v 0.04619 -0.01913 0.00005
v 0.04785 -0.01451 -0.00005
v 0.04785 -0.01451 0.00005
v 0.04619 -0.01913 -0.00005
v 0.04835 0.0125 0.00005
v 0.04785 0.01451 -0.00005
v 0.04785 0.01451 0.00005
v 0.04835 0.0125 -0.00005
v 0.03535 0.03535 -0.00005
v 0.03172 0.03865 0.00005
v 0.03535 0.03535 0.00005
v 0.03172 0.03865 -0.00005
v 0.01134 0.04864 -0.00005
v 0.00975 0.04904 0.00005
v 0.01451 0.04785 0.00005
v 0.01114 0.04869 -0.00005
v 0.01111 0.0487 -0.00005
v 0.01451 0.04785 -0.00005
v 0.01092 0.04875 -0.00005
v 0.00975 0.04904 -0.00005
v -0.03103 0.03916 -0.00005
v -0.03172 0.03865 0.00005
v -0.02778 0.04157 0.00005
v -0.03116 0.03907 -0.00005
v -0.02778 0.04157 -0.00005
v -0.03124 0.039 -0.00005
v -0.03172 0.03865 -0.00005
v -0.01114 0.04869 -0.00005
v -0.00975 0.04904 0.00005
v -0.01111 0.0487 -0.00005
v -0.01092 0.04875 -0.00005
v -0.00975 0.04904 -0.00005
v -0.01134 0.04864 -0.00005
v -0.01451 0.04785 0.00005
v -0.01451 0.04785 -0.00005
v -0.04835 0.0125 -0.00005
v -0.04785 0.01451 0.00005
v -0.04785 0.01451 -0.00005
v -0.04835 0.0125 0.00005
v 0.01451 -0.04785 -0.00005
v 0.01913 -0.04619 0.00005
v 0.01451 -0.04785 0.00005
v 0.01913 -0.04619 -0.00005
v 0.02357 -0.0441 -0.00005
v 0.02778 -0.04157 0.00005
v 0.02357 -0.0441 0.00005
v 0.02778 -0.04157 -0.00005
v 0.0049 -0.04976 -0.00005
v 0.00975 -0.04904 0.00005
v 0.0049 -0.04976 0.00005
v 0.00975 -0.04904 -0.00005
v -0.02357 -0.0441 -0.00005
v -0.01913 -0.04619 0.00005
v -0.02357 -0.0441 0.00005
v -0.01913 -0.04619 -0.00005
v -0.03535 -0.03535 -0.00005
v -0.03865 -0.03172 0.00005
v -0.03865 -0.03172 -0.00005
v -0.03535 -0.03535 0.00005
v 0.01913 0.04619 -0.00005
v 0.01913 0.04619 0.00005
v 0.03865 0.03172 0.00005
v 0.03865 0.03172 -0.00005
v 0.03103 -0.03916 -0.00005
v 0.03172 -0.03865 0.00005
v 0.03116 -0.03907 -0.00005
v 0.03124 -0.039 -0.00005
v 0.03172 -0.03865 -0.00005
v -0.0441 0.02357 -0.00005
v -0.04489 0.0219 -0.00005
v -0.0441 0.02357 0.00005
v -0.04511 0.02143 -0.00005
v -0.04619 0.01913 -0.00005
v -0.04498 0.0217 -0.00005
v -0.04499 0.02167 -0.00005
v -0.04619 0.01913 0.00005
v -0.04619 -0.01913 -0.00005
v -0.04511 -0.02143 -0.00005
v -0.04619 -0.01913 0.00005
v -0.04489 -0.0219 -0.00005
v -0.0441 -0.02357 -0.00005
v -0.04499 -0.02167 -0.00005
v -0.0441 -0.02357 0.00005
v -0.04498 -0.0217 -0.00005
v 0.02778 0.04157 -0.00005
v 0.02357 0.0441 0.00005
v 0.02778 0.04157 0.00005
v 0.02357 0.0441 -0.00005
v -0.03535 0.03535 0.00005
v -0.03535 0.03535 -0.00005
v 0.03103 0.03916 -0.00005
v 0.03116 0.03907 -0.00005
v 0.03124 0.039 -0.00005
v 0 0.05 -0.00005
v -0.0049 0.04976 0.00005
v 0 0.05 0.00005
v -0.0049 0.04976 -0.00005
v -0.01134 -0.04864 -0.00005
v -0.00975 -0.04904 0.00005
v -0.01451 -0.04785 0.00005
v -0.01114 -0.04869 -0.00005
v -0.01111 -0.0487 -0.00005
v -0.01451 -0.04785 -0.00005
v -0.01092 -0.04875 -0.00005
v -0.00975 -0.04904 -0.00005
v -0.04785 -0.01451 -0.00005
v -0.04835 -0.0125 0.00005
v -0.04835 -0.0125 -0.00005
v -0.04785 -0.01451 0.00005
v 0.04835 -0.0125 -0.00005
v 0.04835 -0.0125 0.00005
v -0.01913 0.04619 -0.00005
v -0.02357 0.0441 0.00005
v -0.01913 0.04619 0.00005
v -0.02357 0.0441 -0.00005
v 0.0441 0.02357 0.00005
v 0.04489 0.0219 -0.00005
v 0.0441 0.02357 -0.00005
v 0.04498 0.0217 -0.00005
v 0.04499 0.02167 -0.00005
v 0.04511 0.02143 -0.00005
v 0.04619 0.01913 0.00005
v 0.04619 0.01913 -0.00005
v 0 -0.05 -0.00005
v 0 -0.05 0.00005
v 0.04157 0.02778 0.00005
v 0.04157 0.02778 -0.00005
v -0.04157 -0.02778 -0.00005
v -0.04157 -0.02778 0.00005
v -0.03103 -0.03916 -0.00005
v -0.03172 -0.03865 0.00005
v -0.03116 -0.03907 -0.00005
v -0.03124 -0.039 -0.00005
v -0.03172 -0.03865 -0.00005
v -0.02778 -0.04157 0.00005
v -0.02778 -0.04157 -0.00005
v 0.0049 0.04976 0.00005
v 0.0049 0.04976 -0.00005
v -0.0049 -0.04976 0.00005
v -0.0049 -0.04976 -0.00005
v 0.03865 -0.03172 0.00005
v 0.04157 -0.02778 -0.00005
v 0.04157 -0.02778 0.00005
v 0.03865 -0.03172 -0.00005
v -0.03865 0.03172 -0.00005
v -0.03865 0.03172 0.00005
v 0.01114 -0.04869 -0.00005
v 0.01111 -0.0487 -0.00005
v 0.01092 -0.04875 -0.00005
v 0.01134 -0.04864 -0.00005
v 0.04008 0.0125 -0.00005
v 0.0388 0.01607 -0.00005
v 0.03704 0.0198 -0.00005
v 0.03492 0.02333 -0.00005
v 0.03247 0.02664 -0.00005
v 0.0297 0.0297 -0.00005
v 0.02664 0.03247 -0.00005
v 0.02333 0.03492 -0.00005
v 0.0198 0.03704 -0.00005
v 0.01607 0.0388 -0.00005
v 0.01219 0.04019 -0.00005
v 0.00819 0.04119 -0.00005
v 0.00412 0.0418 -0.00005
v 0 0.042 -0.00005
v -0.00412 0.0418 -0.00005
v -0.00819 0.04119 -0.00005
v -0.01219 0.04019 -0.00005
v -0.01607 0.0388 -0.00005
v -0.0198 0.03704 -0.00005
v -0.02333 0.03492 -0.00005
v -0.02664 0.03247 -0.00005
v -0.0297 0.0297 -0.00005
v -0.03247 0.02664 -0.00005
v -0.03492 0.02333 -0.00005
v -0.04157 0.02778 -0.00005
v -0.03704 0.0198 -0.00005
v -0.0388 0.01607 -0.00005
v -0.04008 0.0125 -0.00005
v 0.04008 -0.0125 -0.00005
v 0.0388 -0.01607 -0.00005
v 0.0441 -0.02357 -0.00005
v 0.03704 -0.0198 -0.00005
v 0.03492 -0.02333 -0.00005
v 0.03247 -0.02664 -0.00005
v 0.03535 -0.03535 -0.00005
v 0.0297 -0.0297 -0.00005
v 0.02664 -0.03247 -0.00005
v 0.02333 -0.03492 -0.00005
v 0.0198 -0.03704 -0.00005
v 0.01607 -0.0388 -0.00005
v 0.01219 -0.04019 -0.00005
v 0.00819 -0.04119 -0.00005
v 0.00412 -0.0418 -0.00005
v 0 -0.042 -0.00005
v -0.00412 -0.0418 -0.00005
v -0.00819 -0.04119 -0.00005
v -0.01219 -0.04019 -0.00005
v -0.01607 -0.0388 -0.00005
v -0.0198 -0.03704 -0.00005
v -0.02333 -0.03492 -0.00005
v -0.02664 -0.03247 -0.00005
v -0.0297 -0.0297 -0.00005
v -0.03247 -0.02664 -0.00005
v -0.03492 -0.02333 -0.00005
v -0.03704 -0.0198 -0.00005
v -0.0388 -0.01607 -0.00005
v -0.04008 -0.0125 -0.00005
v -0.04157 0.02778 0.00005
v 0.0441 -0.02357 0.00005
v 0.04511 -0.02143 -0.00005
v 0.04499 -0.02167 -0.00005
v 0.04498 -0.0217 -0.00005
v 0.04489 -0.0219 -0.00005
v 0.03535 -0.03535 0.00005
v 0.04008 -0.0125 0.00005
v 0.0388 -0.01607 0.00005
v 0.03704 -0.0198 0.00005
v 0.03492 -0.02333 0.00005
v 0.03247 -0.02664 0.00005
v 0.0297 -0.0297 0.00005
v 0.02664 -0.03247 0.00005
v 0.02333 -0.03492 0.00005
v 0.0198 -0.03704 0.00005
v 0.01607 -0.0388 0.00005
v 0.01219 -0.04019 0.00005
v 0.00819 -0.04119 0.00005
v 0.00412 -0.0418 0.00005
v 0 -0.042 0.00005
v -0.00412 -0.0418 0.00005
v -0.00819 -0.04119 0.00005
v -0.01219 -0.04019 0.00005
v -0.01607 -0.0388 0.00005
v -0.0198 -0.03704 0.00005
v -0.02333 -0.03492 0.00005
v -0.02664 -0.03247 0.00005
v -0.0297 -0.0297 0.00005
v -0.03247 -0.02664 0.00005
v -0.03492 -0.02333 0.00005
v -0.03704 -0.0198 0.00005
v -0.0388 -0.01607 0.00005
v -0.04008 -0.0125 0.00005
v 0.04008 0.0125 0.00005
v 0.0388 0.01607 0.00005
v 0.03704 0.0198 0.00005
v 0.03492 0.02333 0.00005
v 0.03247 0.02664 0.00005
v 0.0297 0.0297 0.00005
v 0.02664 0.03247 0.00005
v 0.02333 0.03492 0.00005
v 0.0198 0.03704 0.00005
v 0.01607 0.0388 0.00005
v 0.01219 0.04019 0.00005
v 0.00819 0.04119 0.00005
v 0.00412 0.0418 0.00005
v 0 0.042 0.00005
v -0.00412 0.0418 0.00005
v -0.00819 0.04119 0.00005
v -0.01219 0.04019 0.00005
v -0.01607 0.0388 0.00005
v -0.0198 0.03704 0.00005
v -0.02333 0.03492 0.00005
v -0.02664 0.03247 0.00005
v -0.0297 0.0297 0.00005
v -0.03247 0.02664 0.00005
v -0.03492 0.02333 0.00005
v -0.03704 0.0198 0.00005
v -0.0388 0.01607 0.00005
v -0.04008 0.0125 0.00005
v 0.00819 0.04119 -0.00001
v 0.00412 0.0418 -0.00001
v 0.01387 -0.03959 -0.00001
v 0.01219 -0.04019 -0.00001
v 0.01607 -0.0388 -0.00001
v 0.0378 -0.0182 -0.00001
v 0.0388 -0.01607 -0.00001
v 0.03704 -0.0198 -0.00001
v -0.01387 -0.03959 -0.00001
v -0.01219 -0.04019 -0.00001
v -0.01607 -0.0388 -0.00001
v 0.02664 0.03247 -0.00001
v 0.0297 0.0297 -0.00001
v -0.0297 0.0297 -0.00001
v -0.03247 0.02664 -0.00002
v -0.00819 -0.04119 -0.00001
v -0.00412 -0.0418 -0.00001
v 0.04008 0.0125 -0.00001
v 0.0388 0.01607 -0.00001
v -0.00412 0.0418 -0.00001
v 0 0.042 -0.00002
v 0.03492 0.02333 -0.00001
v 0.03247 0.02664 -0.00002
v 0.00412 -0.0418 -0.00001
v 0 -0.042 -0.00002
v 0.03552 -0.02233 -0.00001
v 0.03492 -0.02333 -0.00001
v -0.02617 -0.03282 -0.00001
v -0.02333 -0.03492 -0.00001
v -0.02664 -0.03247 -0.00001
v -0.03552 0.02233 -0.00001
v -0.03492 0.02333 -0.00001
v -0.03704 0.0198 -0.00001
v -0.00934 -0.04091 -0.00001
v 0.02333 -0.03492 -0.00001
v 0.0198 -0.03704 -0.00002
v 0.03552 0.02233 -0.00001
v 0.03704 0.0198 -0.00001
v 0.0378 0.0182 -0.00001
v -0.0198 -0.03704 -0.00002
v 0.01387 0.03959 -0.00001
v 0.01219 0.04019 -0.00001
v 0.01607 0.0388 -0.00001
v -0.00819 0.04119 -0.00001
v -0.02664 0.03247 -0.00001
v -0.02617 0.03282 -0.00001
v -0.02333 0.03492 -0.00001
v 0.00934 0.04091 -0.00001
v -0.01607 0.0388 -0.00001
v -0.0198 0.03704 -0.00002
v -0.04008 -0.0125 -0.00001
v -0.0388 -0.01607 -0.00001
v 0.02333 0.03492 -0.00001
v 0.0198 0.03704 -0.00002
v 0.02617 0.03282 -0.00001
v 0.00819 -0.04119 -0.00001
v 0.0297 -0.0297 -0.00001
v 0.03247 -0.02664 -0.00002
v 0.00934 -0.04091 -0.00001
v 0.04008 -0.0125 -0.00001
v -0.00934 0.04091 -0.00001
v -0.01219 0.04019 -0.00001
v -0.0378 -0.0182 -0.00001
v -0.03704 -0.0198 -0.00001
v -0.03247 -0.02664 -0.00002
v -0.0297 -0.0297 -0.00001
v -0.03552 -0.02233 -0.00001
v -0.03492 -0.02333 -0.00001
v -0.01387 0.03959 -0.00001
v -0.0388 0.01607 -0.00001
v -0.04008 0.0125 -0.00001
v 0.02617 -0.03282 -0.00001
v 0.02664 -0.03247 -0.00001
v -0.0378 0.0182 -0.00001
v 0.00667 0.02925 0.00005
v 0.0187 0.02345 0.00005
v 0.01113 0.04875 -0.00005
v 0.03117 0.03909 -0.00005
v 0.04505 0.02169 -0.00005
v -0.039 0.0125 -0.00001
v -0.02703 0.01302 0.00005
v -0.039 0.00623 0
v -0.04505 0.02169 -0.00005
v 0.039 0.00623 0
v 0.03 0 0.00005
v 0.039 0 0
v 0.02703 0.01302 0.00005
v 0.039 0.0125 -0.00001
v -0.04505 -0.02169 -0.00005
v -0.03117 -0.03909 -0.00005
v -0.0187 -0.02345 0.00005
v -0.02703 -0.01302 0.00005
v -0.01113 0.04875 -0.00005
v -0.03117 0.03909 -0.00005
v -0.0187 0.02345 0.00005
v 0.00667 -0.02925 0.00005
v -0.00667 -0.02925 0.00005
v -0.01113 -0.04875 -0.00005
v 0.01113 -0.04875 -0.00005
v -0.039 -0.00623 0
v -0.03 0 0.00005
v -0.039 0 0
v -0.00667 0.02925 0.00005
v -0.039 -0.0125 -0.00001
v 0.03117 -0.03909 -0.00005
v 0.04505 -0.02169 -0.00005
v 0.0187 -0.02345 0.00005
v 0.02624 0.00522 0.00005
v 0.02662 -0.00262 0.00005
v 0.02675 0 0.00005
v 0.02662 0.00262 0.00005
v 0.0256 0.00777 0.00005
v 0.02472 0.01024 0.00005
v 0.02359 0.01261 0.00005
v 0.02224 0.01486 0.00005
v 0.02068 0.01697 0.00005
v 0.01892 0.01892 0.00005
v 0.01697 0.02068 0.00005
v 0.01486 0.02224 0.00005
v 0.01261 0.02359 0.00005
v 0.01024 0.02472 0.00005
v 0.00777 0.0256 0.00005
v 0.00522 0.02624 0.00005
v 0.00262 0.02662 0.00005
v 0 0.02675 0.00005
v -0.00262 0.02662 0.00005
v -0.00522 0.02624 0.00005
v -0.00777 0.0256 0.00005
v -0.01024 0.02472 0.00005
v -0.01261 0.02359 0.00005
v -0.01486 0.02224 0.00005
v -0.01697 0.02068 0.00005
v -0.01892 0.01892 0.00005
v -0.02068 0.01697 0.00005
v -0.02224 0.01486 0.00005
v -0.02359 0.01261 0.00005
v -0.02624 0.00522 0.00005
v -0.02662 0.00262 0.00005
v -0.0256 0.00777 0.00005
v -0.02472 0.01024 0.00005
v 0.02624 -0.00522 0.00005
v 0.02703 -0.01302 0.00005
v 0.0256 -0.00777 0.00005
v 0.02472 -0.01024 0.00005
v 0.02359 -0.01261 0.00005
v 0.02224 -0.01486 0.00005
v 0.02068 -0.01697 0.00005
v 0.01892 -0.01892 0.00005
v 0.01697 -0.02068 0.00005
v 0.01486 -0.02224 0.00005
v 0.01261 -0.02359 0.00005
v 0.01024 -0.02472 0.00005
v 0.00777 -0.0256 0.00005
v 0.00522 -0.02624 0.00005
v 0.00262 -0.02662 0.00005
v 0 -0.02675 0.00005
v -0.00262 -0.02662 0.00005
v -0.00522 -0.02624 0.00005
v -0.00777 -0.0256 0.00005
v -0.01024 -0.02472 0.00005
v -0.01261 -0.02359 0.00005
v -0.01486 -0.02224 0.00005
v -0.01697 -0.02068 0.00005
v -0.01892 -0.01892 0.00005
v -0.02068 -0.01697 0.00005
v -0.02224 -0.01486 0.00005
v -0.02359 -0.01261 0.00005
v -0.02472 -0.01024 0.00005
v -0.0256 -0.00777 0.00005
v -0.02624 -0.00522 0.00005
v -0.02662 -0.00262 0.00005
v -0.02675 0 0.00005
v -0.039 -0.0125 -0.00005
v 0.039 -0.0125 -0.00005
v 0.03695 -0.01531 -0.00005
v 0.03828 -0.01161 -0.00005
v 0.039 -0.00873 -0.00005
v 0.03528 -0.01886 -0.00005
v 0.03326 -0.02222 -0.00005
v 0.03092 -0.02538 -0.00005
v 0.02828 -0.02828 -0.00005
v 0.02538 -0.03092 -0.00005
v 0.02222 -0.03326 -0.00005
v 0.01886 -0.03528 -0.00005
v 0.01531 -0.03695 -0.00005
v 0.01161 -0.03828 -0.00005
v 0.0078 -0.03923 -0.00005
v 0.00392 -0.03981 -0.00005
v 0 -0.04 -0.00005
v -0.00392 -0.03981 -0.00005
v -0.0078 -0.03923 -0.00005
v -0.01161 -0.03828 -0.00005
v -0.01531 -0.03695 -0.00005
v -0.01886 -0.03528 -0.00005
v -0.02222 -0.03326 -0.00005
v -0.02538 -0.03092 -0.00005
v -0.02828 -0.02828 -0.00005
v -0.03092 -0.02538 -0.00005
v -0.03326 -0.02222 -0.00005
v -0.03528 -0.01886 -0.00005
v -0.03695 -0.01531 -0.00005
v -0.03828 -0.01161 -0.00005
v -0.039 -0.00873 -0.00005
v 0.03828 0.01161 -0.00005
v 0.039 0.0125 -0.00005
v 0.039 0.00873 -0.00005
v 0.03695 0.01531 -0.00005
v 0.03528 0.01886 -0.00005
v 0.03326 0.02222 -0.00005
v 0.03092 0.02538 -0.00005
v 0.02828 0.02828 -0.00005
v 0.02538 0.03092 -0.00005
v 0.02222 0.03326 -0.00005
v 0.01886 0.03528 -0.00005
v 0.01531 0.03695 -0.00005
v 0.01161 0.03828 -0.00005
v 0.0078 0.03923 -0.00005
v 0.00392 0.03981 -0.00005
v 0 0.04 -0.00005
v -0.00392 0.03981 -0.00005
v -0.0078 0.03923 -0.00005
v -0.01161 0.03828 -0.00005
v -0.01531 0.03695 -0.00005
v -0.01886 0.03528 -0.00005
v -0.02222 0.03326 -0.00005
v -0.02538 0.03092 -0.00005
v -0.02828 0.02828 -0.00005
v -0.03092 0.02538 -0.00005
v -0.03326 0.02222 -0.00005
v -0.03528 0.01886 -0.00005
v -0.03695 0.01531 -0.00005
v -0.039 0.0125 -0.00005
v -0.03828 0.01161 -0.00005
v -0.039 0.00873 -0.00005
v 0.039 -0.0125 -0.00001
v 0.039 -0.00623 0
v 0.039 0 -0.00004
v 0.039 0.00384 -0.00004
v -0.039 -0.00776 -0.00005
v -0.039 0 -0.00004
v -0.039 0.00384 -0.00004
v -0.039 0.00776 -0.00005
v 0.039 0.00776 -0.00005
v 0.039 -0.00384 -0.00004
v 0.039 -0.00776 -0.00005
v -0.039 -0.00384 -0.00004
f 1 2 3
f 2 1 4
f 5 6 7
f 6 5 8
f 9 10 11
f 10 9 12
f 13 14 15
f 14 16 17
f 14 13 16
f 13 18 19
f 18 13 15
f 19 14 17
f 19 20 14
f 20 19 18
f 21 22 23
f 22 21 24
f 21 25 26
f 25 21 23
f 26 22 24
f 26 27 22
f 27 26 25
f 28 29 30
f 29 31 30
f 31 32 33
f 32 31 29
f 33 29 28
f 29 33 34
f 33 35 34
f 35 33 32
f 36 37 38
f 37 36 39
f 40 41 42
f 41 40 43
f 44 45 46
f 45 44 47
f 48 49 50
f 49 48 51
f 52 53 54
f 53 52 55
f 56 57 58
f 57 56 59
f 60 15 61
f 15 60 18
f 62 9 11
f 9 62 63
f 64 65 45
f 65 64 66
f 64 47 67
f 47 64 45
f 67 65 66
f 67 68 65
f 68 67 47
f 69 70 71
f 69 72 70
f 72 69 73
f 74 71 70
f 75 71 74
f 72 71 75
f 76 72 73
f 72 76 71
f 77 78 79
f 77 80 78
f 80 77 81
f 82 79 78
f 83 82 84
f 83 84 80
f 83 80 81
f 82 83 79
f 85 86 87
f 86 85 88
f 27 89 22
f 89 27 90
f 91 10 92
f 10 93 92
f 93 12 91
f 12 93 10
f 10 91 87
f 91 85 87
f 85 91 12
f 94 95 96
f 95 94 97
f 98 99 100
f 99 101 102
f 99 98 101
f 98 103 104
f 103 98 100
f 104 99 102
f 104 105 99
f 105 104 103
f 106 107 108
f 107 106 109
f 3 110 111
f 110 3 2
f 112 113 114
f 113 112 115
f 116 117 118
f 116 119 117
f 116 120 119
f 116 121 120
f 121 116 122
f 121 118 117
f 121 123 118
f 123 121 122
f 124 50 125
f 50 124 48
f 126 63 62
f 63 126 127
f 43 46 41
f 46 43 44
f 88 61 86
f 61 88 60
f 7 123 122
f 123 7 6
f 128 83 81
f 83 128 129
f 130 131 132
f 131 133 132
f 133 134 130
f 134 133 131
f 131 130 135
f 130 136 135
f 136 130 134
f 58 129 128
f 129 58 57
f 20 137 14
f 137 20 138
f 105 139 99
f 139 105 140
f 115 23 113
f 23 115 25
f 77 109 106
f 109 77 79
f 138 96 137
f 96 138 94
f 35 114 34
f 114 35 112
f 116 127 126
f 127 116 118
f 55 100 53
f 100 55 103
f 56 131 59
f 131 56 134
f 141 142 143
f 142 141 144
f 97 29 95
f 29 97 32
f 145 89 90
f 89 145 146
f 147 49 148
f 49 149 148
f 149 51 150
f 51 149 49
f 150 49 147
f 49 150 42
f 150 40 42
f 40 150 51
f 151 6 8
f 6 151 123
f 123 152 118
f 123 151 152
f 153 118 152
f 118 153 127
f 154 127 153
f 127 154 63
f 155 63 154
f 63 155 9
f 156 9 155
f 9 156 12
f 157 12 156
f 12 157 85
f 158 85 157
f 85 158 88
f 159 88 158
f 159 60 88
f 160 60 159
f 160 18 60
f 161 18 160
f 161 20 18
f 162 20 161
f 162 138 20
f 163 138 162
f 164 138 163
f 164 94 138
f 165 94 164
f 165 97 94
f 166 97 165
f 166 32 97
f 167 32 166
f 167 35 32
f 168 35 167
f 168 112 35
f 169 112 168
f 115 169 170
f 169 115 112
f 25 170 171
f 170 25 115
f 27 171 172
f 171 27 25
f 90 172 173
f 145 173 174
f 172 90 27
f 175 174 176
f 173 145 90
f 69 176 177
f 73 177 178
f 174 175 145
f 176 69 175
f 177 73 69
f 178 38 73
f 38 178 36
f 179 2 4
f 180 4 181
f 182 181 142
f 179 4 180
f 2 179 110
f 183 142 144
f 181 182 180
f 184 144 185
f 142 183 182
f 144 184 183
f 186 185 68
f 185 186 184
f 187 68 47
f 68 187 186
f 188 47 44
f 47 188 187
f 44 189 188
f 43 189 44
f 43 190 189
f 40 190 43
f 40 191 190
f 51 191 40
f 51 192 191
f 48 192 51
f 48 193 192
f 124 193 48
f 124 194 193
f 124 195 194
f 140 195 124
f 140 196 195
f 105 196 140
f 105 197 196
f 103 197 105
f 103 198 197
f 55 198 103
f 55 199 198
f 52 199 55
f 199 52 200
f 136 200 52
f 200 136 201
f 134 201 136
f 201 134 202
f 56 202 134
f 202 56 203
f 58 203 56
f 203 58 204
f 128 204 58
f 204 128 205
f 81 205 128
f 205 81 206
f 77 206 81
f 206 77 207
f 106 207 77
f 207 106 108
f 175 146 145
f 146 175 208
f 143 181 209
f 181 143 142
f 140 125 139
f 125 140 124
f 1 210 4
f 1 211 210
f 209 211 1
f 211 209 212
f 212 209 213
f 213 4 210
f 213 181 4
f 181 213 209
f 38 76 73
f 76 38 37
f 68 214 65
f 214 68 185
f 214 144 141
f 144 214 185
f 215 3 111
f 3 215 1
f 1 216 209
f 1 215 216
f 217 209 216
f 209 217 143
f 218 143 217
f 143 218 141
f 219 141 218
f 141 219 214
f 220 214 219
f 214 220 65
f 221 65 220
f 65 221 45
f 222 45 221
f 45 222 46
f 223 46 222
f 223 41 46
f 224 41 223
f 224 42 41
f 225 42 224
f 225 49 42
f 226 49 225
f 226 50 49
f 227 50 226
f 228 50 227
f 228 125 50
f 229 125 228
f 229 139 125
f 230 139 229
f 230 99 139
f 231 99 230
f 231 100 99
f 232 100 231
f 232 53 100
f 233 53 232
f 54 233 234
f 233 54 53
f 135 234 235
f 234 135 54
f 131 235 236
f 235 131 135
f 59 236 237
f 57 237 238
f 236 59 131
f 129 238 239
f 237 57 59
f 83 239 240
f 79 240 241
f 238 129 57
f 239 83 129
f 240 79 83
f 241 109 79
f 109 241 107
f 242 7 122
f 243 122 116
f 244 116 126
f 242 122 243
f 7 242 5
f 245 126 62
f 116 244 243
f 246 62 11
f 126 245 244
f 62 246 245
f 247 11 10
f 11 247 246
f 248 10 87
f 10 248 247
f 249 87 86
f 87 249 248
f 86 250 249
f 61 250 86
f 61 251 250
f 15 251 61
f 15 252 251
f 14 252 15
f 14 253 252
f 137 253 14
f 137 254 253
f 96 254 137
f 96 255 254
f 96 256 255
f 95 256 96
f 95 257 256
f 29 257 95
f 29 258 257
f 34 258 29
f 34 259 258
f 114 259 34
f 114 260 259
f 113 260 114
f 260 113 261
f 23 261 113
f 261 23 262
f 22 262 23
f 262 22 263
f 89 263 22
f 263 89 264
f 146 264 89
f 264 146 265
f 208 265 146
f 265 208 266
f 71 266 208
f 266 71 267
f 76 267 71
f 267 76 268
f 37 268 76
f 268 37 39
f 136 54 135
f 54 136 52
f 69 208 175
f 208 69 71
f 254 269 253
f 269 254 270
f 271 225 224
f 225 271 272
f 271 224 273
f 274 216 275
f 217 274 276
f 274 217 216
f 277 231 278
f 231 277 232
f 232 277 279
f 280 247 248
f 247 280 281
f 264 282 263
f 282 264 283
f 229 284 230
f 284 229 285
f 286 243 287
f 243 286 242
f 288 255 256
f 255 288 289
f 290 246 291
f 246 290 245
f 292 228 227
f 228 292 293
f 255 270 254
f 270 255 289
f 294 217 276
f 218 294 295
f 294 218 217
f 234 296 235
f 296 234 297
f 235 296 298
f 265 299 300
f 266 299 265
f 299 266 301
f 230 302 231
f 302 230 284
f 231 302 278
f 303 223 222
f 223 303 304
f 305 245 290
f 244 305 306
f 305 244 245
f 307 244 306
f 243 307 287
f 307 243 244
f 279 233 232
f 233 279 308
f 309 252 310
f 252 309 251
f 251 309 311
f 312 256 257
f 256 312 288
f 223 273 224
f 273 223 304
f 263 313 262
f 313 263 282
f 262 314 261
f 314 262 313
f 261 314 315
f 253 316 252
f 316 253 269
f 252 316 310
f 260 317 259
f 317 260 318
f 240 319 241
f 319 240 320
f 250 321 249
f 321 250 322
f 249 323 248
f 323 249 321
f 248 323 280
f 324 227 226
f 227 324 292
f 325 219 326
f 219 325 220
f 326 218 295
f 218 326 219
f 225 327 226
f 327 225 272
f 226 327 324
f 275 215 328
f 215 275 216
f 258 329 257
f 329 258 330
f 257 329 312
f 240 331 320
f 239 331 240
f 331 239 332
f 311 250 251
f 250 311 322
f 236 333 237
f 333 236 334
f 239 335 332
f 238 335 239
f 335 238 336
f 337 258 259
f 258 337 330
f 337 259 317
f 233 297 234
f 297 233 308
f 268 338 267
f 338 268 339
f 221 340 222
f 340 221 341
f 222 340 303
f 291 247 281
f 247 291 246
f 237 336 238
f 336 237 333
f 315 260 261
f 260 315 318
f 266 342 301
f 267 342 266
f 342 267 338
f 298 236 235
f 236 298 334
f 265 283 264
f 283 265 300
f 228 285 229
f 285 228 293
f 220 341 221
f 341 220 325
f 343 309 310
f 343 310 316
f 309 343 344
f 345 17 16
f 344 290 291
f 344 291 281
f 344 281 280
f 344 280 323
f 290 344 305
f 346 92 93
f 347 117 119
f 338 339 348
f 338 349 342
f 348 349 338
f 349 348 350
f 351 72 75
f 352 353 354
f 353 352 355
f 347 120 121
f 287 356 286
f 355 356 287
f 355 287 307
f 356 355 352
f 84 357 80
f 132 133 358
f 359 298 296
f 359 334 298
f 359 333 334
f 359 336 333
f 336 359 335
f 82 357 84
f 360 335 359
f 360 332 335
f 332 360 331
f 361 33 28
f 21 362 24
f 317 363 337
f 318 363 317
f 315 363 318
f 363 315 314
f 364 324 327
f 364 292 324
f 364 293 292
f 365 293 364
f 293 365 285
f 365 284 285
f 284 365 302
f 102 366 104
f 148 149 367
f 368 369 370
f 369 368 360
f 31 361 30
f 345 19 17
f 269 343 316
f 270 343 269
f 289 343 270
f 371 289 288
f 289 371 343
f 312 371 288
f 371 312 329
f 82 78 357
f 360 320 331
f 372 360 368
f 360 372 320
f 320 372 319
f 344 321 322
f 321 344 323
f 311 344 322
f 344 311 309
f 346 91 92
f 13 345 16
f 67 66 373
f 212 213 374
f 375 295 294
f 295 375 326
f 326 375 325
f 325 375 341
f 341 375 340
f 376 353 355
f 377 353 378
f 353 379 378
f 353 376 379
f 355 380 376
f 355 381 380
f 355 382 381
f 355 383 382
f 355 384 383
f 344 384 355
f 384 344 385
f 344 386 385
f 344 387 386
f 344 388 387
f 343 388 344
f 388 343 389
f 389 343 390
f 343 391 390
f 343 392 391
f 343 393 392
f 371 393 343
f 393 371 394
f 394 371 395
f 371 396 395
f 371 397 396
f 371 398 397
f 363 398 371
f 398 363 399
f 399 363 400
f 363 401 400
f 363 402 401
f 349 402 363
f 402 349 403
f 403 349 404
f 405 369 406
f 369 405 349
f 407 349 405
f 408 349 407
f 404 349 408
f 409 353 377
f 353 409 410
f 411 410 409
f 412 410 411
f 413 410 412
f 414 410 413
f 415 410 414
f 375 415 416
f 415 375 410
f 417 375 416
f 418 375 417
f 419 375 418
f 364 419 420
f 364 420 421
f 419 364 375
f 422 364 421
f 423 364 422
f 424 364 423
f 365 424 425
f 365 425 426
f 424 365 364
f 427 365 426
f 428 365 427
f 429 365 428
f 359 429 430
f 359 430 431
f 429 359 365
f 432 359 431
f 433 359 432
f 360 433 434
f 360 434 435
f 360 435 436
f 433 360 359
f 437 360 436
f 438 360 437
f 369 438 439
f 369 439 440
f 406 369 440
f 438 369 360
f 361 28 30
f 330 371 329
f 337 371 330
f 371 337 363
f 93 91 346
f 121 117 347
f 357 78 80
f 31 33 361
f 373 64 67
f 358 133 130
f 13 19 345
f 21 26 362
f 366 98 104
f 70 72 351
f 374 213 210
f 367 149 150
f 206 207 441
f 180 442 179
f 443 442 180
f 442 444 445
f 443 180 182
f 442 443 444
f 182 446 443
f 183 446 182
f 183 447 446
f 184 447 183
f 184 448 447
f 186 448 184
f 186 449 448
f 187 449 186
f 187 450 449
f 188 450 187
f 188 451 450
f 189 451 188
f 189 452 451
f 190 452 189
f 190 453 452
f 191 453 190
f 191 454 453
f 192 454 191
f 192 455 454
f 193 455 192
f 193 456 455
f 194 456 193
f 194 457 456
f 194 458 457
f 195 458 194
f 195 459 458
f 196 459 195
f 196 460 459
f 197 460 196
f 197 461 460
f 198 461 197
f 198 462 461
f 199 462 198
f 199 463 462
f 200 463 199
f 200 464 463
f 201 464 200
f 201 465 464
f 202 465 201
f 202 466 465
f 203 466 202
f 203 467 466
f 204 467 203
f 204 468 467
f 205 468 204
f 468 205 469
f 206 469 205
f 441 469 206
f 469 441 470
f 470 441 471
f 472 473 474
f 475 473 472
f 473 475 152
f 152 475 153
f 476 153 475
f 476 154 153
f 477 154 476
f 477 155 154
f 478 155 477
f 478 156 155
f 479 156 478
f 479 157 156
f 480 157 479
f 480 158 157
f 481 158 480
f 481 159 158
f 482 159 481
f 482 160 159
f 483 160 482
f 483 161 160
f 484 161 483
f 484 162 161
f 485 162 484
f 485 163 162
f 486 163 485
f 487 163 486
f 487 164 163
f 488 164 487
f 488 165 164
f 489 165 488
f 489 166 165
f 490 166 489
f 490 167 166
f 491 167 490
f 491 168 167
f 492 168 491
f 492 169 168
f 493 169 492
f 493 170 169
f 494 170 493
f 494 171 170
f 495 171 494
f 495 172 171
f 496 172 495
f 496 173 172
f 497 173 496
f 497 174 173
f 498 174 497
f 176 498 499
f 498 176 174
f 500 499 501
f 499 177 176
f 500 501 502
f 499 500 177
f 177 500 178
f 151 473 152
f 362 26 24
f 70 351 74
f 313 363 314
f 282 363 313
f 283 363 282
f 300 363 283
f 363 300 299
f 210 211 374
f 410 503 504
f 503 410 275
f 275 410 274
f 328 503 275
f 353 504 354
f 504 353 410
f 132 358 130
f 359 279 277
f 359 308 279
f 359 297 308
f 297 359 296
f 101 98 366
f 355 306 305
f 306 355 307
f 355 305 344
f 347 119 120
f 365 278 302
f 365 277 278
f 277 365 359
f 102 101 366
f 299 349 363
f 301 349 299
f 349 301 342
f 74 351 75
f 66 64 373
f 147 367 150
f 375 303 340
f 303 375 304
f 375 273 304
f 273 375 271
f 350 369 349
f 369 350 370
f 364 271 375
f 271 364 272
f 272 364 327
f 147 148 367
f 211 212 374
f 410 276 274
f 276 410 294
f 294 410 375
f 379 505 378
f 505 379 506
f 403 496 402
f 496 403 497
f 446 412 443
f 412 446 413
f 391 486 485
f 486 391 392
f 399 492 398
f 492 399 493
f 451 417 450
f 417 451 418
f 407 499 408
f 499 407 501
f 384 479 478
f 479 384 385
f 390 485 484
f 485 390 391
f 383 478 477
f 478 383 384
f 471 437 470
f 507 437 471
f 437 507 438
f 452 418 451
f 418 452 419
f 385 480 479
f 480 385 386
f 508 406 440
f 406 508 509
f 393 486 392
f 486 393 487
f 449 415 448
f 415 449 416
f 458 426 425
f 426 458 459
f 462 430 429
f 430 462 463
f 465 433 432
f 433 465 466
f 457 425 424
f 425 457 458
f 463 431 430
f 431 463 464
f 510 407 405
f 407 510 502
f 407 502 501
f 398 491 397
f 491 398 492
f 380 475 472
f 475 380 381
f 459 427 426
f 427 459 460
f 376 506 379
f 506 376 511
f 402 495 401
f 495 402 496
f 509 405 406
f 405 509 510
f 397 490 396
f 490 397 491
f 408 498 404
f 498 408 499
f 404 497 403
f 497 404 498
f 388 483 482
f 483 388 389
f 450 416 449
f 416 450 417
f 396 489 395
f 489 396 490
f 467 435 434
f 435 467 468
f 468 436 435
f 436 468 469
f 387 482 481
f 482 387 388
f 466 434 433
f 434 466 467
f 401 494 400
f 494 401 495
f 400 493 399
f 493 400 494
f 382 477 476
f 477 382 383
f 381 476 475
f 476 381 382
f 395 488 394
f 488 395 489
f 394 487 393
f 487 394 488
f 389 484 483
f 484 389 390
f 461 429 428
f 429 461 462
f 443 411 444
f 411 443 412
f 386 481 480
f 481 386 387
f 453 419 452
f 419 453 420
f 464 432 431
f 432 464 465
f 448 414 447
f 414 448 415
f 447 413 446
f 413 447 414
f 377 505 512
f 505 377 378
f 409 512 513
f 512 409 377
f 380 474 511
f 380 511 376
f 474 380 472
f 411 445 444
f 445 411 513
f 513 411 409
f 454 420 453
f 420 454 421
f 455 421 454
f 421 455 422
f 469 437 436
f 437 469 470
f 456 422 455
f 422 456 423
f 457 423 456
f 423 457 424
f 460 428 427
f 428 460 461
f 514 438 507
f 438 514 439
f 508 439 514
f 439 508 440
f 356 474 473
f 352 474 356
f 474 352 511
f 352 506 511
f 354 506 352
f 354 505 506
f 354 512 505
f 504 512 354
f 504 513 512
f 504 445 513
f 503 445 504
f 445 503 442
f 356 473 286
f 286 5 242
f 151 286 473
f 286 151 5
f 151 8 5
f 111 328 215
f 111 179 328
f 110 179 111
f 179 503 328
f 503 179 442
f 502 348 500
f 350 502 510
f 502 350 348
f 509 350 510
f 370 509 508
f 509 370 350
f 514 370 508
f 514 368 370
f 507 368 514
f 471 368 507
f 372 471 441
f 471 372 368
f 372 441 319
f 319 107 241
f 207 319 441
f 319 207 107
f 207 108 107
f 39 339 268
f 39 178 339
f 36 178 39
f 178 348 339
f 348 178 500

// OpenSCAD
$fn=64;

size_x = 0.1;
size_y = 0.1;
size_z = 0.0;

module faceted_outer(h=0.0001, r1=0.05, r2=0.03, facets=12){
    cylinder(h=h, r1=r1, r2=r2, $fn=facets);
}

module rim_lip(h=0.0001, r_outer=0.05, r_inner=0.042){
    difference(){
        cylinder(h=h, r=r_outer, $fn=64);
        translate([0,0,-0.0002]) cylinder(h=h+0.0004, r=r_inner, $fn=64);
    }
}

module interior_cavity(h=0.0001, r_top=0.04, r_bottom=0.0){
    cylinder(h=h, r1=r_top, r2=r_bottom, $fn=64);
}

module side_notch(w=0.012, d=0.01, h=0.0001){
    translate([0.05 - d/2, 0, h/2])
        cube([d, w, h+0.0004], center=true);
}

module cup(){
    h = (size_z <= 0) ? 0.0001 : size_z;
    r_rim = size_x/2;
    r_body_bottom = r_rim*0.6;
    r_cavity = r_rim*0.8;
    lip_thickness = r_rim*0.16;

    difference(){
        union(){
            translate([0,0,-h/2]) faceted_outer(h=h, r1=r_rim, r2=r_body_bottom, facets=14);
            translate([0,0,-h/2]) rim_lip(h=h, r_outer=r_rim, r_inner=r_rim - lip_thickness);
        }
        translate([0,0,-h/2]) interior_cavity(h=h+0.0002, r_top=r_cavity, r_bottom=0.0);
        translate([0,0,-h/2]) side_notch(w=r_rim*0.5, d=r_rim*0.22, h=h);
        rotate([0,0,180]) translate([0,0,-h/2]) side_notch(w=r_rim*0.5, d=r_rim*0.22, h=h);
    }
}

cup();
